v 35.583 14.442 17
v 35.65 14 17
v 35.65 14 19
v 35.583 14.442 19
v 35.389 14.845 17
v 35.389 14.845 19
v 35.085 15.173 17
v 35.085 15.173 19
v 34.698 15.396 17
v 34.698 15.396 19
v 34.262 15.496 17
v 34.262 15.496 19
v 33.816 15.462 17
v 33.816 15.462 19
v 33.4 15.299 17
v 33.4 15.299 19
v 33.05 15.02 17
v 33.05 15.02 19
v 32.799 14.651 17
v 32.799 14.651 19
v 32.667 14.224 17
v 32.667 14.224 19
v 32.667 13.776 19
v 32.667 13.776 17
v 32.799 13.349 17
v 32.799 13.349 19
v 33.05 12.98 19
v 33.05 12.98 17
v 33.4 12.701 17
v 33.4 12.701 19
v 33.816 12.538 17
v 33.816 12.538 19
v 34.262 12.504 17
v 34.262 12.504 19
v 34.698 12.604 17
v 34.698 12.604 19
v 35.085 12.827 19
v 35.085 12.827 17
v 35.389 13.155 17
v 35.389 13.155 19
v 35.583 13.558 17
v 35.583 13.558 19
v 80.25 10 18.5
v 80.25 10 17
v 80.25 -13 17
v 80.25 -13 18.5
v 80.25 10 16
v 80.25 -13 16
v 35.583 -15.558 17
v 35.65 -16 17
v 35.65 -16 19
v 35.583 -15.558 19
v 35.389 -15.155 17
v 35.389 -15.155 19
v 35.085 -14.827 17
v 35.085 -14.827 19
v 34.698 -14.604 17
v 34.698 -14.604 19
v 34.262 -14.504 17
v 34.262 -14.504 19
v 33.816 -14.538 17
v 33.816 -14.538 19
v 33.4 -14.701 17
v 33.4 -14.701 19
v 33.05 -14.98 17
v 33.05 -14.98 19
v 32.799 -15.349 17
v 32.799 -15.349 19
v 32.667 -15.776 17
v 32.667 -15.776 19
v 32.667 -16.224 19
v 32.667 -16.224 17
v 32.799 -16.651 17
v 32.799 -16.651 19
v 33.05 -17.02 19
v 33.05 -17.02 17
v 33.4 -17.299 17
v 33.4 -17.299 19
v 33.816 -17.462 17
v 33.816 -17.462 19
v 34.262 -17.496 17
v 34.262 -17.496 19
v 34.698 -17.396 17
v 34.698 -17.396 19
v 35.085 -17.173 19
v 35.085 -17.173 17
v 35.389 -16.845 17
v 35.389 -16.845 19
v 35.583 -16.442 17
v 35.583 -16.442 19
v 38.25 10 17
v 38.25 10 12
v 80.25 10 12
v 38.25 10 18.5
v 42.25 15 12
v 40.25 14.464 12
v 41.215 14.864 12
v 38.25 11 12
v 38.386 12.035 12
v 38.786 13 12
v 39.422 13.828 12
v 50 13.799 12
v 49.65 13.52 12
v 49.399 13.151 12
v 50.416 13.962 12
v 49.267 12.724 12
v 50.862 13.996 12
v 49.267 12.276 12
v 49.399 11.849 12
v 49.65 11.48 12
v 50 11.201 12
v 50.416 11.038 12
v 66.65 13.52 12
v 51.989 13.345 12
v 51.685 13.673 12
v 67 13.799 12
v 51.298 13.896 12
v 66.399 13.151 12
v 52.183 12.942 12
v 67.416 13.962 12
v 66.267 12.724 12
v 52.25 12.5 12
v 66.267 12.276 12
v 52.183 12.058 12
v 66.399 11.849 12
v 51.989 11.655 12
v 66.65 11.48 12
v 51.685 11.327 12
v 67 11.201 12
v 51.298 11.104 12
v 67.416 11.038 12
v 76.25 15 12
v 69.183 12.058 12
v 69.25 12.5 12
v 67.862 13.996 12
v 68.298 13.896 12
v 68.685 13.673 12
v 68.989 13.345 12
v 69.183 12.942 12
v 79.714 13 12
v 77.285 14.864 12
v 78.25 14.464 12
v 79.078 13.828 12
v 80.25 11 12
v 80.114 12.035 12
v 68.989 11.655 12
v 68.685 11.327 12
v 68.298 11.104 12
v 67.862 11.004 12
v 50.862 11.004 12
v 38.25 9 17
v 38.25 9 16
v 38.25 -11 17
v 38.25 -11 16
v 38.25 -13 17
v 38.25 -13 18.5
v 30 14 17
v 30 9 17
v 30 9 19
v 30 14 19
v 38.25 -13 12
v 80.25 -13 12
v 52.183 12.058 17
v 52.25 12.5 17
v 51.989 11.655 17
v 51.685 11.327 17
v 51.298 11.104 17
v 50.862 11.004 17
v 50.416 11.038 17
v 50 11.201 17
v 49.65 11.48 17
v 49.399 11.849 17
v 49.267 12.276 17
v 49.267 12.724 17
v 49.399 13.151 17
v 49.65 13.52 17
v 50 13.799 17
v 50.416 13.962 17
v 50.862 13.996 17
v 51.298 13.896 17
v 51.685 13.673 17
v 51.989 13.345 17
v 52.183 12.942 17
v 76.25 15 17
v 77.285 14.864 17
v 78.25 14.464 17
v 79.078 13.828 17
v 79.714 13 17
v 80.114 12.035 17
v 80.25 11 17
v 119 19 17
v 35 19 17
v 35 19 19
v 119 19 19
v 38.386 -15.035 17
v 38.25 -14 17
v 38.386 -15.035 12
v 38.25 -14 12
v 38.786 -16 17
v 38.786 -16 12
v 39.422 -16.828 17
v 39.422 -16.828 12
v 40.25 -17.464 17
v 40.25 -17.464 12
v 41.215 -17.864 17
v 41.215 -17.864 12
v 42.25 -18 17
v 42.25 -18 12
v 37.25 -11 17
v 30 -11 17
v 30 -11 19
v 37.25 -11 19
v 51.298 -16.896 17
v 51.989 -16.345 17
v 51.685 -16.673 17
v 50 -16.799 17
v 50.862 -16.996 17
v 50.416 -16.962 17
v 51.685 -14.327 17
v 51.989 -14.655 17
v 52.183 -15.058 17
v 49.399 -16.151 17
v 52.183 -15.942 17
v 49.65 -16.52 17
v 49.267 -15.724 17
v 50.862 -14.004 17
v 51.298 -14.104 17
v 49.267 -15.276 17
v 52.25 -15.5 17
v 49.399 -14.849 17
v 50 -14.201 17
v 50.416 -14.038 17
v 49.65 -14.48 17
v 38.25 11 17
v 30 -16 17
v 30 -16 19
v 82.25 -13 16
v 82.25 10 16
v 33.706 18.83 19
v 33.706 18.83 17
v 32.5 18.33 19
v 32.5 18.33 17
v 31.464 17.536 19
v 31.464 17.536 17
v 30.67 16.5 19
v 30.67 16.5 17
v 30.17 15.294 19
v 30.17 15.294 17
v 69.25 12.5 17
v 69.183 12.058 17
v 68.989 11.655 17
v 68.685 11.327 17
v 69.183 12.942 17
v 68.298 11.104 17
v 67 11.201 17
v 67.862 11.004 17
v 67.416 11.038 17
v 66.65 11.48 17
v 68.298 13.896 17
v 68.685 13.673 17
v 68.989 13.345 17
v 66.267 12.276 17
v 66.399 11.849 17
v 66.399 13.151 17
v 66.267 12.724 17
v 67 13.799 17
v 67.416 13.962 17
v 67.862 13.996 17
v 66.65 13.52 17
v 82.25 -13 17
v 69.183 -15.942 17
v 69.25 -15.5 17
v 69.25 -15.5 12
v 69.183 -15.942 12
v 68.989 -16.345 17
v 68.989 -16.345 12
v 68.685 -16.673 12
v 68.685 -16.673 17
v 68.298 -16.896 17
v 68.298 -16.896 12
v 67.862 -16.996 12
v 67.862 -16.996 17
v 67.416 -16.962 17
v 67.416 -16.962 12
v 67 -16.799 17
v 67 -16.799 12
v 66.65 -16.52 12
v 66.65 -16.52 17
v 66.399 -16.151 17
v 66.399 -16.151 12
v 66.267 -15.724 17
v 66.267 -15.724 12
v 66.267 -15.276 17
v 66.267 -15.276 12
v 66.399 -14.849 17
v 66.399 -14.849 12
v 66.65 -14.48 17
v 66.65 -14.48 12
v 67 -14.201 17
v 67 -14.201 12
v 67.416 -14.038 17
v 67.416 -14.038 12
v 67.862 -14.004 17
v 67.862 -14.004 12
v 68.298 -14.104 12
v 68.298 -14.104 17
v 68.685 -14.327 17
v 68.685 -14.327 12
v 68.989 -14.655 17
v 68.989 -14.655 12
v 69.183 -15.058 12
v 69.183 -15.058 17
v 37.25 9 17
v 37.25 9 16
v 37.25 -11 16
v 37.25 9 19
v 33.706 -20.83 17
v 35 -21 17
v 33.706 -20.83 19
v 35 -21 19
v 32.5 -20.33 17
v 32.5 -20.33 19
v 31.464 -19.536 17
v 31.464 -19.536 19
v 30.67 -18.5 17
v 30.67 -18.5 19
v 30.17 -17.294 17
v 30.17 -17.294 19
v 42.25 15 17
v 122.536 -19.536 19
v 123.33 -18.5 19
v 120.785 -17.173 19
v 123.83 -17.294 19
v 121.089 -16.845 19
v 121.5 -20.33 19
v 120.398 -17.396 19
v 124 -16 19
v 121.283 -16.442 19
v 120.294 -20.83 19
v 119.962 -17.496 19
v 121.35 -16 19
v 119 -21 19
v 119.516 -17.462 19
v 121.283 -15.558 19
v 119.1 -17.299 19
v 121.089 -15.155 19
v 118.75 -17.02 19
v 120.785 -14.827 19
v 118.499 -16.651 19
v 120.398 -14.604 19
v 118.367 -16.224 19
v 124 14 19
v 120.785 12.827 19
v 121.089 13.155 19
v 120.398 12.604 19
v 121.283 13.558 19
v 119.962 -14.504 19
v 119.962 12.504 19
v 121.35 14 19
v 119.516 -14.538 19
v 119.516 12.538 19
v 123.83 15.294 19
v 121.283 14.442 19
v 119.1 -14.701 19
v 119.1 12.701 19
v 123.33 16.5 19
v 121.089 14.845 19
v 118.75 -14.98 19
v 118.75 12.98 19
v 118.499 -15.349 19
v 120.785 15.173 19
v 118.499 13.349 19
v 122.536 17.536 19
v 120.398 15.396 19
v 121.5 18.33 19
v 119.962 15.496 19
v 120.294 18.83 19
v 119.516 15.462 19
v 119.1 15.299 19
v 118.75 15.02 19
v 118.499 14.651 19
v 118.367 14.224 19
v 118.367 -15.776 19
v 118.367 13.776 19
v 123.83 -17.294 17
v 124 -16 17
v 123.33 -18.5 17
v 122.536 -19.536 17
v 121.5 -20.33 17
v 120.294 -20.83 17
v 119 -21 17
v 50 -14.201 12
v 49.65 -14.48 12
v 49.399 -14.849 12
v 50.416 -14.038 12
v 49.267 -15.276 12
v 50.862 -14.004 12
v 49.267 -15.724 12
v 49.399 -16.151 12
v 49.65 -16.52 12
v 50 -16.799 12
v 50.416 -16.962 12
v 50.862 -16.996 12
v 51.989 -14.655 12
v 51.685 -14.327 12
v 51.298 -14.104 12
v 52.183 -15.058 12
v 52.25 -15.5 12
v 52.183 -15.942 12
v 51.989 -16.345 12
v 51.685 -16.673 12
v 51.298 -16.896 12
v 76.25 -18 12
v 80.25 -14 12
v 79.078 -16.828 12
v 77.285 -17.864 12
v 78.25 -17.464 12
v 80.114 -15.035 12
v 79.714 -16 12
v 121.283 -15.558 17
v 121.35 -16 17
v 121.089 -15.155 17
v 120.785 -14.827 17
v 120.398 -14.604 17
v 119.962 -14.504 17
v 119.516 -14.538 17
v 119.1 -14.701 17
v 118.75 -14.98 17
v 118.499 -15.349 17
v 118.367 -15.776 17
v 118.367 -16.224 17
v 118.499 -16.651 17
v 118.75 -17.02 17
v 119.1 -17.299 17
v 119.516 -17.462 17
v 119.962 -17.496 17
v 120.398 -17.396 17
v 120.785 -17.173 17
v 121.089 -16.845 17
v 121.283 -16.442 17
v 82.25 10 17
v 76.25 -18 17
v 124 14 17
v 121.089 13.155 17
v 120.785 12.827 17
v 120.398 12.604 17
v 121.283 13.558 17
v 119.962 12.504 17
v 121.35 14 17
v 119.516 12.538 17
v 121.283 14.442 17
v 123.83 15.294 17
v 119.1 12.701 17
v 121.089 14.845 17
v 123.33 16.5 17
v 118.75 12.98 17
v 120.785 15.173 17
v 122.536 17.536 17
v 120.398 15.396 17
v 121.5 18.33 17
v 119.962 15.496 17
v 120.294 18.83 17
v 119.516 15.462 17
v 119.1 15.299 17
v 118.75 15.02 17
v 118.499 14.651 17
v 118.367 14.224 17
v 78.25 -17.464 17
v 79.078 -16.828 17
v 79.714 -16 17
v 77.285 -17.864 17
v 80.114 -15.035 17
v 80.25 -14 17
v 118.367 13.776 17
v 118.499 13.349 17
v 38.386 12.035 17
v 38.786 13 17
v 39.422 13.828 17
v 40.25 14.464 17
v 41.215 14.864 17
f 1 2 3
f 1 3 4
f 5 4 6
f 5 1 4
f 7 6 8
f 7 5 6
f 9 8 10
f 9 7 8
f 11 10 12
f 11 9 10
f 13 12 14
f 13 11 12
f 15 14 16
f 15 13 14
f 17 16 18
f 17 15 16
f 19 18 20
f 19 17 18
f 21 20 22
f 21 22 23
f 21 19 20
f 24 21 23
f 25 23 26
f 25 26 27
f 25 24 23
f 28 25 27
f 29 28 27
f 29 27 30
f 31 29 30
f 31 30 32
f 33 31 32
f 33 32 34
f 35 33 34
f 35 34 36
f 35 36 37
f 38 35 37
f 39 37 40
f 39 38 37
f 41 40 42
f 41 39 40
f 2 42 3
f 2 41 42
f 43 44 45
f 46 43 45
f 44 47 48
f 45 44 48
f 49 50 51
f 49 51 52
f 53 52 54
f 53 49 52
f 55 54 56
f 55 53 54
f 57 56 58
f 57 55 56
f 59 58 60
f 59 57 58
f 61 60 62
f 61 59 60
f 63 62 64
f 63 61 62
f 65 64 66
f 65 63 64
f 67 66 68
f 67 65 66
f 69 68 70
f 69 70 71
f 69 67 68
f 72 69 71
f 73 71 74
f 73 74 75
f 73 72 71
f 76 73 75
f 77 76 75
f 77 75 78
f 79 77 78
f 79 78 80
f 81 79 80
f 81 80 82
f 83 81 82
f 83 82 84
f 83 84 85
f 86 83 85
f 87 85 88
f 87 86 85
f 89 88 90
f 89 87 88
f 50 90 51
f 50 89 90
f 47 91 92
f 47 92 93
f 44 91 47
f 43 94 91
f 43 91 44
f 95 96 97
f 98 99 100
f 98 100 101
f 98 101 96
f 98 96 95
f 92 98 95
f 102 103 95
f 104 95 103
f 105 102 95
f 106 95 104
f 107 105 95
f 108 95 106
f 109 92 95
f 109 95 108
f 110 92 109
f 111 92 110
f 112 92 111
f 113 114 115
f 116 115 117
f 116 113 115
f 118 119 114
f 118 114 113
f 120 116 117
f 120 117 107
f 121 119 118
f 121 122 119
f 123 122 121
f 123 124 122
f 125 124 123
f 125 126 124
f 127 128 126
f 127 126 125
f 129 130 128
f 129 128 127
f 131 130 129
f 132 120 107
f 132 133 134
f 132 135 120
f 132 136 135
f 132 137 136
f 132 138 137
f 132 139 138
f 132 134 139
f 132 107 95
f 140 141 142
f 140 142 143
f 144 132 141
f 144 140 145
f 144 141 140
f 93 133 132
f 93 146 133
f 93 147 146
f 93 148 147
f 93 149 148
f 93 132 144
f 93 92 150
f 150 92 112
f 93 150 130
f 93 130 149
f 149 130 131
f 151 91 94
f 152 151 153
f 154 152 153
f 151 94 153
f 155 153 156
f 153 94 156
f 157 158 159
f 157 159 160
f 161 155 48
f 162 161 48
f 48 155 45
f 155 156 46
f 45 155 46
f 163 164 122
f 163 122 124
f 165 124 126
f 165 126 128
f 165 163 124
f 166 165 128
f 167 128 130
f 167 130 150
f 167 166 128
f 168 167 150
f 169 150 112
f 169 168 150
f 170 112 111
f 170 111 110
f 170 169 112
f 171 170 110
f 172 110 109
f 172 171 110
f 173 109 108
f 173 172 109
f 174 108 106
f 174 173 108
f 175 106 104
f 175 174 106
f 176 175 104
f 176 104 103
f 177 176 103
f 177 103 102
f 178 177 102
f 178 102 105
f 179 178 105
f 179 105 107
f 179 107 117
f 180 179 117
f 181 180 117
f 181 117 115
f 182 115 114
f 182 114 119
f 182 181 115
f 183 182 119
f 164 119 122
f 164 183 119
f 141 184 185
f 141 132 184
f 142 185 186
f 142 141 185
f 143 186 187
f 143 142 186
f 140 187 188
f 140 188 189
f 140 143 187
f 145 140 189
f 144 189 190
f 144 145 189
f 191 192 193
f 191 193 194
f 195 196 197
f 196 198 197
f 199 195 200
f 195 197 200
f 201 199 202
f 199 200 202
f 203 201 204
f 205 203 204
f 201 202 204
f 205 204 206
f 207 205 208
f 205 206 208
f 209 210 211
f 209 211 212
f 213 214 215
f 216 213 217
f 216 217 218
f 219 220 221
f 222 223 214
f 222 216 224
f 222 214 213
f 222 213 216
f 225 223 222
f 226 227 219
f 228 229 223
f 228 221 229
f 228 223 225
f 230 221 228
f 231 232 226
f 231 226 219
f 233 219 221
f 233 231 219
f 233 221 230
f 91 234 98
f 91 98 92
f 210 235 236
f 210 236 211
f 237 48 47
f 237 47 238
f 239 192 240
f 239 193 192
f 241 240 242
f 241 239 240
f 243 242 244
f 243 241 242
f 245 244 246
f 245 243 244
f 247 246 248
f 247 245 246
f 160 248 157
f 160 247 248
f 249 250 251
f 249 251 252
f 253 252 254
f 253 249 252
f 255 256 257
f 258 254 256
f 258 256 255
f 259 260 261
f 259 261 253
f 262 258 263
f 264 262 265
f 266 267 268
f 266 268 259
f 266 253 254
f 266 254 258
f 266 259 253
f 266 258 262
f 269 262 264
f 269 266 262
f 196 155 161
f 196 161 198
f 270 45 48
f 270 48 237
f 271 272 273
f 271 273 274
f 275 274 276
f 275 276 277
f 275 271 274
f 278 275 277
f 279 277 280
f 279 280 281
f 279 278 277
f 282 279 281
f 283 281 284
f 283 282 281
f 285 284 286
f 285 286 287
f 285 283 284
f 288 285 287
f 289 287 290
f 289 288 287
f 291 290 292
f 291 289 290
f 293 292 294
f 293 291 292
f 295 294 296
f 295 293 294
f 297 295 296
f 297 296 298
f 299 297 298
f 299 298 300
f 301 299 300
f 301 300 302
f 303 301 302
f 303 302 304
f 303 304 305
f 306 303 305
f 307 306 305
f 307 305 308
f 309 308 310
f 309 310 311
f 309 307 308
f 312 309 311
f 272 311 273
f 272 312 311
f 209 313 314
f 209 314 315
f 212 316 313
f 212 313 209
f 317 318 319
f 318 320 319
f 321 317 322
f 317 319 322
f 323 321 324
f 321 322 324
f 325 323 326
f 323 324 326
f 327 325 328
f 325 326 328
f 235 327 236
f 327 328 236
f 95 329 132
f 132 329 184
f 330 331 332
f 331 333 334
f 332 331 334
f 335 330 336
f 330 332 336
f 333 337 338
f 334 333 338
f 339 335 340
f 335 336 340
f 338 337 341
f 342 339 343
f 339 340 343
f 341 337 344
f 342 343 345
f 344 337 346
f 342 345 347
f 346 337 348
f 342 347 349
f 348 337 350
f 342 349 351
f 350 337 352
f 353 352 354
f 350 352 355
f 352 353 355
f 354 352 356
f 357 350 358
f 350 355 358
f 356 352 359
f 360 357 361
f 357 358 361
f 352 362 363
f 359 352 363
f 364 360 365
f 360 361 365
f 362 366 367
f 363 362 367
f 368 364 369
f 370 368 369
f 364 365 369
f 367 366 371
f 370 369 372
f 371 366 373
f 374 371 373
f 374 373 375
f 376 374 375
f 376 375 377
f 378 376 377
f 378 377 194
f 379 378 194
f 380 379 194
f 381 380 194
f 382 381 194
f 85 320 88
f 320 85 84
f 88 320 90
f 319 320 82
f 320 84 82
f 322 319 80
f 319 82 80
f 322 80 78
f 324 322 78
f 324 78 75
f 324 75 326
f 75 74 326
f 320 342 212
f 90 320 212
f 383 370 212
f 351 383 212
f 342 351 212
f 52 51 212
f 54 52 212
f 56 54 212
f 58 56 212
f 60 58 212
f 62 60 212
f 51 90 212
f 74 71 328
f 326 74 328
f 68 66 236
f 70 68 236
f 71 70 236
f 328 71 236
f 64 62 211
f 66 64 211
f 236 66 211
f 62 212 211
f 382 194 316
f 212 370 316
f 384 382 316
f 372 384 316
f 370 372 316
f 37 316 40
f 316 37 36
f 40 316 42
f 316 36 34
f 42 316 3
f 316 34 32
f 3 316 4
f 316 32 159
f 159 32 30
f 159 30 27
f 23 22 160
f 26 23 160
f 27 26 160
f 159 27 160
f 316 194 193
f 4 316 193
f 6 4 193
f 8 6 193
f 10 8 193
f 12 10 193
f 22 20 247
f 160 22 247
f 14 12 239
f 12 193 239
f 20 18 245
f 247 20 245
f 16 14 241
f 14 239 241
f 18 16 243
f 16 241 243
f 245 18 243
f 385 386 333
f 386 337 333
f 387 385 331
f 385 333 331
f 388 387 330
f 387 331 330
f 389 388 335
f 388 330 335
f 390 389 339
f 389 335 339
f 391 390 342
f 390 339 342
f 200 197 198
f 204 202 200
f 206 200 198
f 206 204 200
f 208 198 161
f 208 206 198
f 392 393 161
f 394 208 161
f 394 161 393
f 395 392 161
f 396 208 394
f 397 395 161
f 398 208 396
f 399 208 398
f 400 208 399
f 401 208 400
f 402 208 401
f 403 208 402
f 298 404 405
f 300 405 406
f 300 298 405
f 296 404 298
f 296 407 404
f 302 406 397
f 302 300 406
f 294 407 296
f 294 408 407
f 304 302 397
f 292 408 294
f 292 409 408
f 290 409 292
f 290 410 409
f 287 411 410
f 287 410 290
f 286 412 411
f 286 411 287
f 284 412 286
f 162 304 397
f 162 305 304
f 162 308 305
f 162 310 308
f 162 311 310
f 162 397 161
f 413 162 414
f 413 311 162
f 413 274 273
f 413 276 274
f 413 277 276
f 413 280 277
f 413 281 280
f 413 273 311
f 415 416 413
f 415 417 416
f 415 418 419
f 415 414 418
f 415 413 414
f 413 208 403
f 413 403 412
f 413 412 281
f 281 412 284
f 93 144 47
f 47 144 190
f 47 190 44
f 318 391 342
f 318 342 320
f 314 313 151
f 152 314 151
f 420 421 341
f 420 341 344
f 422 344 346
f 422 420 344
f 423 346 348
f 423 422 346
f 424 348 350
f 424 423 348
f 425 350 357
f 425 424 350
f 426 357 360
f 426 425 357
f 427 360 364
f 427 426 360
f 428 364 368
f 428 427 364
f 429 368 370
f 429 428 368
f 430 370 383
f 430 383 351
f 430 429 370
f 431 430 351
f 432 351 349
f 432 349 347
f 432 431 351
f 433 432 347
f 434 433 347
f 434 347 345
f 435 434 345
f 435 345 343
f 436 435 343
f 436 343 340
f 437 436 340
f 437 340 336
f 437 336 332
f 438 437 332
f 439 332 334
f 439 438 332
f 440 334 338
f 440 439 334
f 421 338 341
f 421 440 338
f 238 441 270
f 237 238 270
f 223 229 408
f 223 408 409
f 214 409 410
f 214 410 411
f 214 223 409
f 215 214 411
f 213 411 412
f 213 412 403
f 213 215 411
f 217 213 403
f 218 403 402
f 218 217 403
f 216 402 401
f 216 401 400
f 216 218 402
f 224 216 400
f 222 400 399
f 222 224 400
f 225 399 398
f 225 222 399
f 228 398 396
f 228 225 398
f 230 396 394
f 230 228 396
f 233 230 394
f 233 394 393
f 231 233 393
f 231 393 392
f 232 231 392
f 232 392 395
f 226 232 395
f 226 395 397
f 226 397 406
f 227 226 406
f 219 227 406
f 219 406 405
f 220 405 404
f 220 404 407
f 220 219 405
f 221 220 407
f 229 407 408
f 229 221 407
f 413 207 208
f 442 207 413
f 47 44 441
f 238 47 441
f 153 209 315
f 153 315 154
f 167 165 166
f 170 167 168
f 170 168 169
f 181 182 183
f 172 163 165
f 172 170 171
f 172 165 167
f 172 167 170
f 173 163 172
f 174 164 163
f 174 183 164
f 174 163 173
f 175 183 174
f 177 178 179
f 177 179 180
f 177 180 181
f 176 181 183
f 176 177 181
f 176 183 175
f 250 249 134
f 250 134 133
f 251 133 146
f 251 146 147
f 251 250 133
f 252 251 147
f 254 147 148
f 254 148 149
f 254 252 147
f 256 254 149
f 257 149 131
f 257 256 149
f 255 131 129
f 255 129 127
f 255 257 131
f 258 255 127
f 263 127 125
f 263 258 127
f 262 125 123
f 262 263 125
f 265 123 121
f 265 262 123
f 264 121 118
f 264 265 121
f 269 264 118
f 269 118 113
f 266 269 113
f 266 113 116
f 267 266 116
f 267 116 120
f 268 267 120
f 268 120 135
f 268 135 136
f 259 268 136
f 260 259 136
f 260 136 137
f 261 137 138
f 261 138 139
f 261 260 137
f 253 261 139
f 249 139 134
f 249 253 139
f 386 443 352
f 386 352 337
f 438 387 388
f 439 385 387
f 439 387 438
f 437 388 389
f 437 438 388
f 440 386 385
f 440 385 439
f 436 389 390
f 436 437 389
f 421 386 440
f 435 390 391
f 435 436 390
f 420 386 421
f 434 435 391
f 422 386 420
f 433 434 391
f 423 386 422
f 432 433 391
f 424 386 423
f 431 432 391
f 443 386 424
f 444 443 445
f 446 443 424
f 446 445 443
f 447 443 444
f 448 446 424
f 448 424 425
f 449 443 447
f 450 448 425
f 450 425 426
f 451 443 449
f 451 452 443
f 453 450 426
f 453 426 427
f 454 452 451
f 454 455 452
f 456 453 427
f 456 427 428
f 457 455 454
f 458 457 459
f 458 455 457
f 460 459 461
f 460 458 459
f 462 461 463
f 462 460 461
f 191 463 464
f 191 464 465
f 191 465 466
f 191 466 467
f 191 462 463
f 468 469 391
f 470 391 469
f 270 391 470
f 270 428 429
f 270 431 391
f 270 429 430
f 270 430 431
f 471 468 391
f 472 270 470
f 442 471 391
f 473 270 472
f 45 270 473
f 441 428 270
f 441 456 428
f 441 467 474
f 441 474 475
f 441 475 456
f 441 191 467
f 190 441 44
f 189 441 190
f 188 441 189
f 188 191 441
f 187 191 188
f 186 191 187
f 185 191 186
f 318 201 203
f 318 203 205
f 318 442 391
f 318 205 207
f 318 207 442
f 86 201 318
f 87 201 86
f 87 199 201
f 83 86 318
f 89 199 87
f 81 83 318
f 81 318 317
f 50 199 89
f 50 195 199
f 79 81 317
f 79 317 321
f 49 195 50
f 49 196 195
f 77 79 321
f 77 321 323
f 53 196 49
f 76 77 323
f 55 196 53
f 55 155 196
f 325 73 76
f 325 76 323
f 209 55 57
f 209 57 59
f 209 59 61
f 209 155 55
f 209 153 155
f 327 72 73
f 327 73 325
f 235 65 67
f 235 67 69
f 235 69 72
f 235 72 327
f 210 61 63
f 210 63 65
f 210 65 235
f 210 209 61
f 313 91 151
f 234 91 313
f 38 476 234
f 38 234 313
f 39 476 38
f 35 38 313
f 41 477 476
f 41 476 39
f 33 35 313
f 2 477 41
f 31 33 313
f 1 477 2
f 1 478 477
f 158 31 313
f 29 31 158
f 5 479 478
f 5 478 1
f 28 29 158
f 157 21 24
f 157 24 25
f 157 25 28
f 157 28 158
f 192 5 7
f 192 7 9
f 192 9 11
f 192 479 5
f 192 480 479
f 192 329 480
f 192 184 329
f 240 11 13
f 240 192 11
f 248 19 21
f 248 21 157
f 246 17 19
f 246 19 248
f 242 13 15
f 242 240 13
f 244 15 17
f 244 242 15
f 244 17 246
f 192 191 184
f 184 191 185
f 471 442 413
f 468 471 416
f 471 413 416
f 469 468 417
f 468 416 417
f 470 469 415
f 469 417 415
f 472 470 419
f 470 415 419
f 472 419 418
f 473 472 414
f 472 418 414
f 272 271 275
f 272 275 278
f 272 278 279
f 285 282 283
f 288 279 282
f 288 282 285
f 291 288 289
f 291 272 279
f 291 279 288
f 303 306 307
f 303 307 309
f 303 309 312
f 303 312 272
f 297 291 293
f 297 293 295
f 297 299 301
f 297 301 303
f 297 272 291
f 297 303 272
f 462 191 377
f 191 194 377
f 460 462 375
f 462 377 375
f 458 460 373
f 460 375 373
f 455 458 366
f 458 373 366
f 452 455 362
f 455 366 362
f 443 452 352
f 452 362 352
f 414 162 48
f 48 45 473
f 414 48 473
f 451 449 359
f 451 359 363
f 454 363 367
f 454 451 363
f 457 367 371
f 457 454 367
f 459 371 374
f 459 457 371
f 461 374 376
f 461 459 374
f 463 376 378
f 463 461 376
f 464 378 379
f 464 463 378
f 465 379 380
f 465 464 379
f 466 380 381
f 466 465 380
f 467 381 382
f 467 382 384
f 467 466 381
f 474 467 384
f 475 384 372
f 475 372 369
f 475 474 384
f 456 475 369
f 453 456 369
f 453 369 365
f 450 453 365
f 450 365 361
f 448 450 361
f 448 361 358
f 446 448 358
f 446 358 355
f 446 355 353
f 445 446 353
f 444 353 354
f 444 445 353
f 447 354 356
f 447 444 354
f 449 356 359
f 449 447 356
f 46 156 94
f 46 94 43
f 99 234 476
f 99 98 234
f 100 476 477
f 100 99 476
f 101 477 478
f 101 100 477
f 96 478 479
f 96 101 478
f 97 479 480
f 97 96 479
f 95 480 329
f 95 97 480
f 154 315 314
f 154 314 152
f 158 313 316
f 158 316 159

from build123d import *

# Parameters (mm, degrees)
SKETCH_R        = 1.5
PAD_DEPTH       = 2
FILLET001_R     = 5
SKETCH003_W     = 42
SKETCH003_H     = 23
POCKET001_DEPTH = 1.5
SKETCH004_W     = 42
SKETCH004_H     = 5
SKETCH004_R     = 1.5
PAD002_DEPTH    = 5
FILLET002_R     = 4
SKETCH007_W     = 1
SKETCH007_H     = 20
SKETCH007_W_2   = 2
SKETCH007_H_2   = 23
PAD004_DEPTH    = 1


with BuildPart() as part:
    # Sketch → Pad (new body)
    with BuildSketch(Plane.XY):
        Polygon((-47, 20), (47, 20), (47, -20), (-47, -20), (-47, -10), (-39.75, -10), (-39.75, 10), (-47, 10), align=None)
        with Locations((-42.85, 15)):
            Circle(SKETCH_R, mode=Mode.SUBTRACT)
        with Locations((-42.85, -15)):
            Circle(SKETCH_R, mode=Mode.SUBTRACT)
        with Locations((42.85, -15)):
            Circle(SKETCH_R, mode=Mode.SUBTRACT)
        with Locations((42.85, 15)):
            Circle(SKETCH_R, mode=Mode.SUBTRACT)
    extrude(amount=PAD_DEPTH)

    # Fillet001
    fillet001_edges = [part.edges().sort_by_distance(p)[0] for p in [
        (47, -20, 1),
        (47, 20, 1),
        (-47, -20, 1),
        (-47, 20, 1),
    ]]
    fillet(fillet001_edges, radius=FILLET001_R)

    # Sketch003 (on Face2 of Fillet001) → Pocket001 (cut)
    with BuildSketch(Plane(origin=(0, 0, 0), x_dir=(1, 0, 0), z_dir=(0, 0, -1))):
        with Locations((-17.75, 0.5)):
            Rectangle(SKETCH003_W, SKETCH003_H)
    extrude(amount=-POCKET001_DEPTH, mode=Mode.SUBTRACT)

    # Sketch004 (on Face2 of Pocket001) → Pad002 (join)
    with BuildSketch(Plane(origin=(0, 0, 0), x_dir=(1, 0, 0), z_dir=(0, 0, -1))):
        with Locations((-17.75, 14.5)):
            Rectangle(SKETCH004_W, SKETCH004_H)
        with Locations((-26.25, 14.5)):
            Circle(SKETCH004_R, mode=Mode.SUBTRACT)
        with Locations((-9.25, 14.5)):
            Circle(SKETCH004_R, mode=Mode.SUBTRACT)
        with Locations((-17.75, -13.5)):
            Rectangle(SKETCH004_W, SKETCH004_H)
        with Locations((-26.25, -13.5)):
            Circle(SKETCH004_R, mode=Mode.SUBTRACT)
        with Locations((-9.25, -13.5)):
            Circle(SKETCH004_R, mode=Mode.SUBTRACT)
    extrude(amount=PAD002_DEPTH)

    # Fillet002
    fillet002_edges = [part.edges().sort_by_distance(p)[0] for p in [
        (3.25, 16, -2.5),
        (3.25, -17, -2.5),
        (-38.75, 16, -2.5),
        (-38.75, -17, -2.5),
    ]]
    fillet(fillet002_edges, radius=FILLET002_R)

    # Sketch007 (on Face1 of Fillet002) → Pad004 (join)
    with BuildSketch(Plane(origin=(0, 0, 0), x_dir=(1, 0, 0), z_dir=(0, 0, -1))):
        with Locations((-39.25, 0)):
            Rectangle(SKETCH007_W, SKETCH007_H)
        with Locations((4.25, 0.5)):
            Rectangle(SKETCH007_W_2, SKETCH007_H_2)
    extrude(amount=PAD004_DEPTH)


with BuildPart() as part_1:
    # Body placement: moved
    add(part.part.moved(Location((77, -1, 17))))


solid = part_1.part
